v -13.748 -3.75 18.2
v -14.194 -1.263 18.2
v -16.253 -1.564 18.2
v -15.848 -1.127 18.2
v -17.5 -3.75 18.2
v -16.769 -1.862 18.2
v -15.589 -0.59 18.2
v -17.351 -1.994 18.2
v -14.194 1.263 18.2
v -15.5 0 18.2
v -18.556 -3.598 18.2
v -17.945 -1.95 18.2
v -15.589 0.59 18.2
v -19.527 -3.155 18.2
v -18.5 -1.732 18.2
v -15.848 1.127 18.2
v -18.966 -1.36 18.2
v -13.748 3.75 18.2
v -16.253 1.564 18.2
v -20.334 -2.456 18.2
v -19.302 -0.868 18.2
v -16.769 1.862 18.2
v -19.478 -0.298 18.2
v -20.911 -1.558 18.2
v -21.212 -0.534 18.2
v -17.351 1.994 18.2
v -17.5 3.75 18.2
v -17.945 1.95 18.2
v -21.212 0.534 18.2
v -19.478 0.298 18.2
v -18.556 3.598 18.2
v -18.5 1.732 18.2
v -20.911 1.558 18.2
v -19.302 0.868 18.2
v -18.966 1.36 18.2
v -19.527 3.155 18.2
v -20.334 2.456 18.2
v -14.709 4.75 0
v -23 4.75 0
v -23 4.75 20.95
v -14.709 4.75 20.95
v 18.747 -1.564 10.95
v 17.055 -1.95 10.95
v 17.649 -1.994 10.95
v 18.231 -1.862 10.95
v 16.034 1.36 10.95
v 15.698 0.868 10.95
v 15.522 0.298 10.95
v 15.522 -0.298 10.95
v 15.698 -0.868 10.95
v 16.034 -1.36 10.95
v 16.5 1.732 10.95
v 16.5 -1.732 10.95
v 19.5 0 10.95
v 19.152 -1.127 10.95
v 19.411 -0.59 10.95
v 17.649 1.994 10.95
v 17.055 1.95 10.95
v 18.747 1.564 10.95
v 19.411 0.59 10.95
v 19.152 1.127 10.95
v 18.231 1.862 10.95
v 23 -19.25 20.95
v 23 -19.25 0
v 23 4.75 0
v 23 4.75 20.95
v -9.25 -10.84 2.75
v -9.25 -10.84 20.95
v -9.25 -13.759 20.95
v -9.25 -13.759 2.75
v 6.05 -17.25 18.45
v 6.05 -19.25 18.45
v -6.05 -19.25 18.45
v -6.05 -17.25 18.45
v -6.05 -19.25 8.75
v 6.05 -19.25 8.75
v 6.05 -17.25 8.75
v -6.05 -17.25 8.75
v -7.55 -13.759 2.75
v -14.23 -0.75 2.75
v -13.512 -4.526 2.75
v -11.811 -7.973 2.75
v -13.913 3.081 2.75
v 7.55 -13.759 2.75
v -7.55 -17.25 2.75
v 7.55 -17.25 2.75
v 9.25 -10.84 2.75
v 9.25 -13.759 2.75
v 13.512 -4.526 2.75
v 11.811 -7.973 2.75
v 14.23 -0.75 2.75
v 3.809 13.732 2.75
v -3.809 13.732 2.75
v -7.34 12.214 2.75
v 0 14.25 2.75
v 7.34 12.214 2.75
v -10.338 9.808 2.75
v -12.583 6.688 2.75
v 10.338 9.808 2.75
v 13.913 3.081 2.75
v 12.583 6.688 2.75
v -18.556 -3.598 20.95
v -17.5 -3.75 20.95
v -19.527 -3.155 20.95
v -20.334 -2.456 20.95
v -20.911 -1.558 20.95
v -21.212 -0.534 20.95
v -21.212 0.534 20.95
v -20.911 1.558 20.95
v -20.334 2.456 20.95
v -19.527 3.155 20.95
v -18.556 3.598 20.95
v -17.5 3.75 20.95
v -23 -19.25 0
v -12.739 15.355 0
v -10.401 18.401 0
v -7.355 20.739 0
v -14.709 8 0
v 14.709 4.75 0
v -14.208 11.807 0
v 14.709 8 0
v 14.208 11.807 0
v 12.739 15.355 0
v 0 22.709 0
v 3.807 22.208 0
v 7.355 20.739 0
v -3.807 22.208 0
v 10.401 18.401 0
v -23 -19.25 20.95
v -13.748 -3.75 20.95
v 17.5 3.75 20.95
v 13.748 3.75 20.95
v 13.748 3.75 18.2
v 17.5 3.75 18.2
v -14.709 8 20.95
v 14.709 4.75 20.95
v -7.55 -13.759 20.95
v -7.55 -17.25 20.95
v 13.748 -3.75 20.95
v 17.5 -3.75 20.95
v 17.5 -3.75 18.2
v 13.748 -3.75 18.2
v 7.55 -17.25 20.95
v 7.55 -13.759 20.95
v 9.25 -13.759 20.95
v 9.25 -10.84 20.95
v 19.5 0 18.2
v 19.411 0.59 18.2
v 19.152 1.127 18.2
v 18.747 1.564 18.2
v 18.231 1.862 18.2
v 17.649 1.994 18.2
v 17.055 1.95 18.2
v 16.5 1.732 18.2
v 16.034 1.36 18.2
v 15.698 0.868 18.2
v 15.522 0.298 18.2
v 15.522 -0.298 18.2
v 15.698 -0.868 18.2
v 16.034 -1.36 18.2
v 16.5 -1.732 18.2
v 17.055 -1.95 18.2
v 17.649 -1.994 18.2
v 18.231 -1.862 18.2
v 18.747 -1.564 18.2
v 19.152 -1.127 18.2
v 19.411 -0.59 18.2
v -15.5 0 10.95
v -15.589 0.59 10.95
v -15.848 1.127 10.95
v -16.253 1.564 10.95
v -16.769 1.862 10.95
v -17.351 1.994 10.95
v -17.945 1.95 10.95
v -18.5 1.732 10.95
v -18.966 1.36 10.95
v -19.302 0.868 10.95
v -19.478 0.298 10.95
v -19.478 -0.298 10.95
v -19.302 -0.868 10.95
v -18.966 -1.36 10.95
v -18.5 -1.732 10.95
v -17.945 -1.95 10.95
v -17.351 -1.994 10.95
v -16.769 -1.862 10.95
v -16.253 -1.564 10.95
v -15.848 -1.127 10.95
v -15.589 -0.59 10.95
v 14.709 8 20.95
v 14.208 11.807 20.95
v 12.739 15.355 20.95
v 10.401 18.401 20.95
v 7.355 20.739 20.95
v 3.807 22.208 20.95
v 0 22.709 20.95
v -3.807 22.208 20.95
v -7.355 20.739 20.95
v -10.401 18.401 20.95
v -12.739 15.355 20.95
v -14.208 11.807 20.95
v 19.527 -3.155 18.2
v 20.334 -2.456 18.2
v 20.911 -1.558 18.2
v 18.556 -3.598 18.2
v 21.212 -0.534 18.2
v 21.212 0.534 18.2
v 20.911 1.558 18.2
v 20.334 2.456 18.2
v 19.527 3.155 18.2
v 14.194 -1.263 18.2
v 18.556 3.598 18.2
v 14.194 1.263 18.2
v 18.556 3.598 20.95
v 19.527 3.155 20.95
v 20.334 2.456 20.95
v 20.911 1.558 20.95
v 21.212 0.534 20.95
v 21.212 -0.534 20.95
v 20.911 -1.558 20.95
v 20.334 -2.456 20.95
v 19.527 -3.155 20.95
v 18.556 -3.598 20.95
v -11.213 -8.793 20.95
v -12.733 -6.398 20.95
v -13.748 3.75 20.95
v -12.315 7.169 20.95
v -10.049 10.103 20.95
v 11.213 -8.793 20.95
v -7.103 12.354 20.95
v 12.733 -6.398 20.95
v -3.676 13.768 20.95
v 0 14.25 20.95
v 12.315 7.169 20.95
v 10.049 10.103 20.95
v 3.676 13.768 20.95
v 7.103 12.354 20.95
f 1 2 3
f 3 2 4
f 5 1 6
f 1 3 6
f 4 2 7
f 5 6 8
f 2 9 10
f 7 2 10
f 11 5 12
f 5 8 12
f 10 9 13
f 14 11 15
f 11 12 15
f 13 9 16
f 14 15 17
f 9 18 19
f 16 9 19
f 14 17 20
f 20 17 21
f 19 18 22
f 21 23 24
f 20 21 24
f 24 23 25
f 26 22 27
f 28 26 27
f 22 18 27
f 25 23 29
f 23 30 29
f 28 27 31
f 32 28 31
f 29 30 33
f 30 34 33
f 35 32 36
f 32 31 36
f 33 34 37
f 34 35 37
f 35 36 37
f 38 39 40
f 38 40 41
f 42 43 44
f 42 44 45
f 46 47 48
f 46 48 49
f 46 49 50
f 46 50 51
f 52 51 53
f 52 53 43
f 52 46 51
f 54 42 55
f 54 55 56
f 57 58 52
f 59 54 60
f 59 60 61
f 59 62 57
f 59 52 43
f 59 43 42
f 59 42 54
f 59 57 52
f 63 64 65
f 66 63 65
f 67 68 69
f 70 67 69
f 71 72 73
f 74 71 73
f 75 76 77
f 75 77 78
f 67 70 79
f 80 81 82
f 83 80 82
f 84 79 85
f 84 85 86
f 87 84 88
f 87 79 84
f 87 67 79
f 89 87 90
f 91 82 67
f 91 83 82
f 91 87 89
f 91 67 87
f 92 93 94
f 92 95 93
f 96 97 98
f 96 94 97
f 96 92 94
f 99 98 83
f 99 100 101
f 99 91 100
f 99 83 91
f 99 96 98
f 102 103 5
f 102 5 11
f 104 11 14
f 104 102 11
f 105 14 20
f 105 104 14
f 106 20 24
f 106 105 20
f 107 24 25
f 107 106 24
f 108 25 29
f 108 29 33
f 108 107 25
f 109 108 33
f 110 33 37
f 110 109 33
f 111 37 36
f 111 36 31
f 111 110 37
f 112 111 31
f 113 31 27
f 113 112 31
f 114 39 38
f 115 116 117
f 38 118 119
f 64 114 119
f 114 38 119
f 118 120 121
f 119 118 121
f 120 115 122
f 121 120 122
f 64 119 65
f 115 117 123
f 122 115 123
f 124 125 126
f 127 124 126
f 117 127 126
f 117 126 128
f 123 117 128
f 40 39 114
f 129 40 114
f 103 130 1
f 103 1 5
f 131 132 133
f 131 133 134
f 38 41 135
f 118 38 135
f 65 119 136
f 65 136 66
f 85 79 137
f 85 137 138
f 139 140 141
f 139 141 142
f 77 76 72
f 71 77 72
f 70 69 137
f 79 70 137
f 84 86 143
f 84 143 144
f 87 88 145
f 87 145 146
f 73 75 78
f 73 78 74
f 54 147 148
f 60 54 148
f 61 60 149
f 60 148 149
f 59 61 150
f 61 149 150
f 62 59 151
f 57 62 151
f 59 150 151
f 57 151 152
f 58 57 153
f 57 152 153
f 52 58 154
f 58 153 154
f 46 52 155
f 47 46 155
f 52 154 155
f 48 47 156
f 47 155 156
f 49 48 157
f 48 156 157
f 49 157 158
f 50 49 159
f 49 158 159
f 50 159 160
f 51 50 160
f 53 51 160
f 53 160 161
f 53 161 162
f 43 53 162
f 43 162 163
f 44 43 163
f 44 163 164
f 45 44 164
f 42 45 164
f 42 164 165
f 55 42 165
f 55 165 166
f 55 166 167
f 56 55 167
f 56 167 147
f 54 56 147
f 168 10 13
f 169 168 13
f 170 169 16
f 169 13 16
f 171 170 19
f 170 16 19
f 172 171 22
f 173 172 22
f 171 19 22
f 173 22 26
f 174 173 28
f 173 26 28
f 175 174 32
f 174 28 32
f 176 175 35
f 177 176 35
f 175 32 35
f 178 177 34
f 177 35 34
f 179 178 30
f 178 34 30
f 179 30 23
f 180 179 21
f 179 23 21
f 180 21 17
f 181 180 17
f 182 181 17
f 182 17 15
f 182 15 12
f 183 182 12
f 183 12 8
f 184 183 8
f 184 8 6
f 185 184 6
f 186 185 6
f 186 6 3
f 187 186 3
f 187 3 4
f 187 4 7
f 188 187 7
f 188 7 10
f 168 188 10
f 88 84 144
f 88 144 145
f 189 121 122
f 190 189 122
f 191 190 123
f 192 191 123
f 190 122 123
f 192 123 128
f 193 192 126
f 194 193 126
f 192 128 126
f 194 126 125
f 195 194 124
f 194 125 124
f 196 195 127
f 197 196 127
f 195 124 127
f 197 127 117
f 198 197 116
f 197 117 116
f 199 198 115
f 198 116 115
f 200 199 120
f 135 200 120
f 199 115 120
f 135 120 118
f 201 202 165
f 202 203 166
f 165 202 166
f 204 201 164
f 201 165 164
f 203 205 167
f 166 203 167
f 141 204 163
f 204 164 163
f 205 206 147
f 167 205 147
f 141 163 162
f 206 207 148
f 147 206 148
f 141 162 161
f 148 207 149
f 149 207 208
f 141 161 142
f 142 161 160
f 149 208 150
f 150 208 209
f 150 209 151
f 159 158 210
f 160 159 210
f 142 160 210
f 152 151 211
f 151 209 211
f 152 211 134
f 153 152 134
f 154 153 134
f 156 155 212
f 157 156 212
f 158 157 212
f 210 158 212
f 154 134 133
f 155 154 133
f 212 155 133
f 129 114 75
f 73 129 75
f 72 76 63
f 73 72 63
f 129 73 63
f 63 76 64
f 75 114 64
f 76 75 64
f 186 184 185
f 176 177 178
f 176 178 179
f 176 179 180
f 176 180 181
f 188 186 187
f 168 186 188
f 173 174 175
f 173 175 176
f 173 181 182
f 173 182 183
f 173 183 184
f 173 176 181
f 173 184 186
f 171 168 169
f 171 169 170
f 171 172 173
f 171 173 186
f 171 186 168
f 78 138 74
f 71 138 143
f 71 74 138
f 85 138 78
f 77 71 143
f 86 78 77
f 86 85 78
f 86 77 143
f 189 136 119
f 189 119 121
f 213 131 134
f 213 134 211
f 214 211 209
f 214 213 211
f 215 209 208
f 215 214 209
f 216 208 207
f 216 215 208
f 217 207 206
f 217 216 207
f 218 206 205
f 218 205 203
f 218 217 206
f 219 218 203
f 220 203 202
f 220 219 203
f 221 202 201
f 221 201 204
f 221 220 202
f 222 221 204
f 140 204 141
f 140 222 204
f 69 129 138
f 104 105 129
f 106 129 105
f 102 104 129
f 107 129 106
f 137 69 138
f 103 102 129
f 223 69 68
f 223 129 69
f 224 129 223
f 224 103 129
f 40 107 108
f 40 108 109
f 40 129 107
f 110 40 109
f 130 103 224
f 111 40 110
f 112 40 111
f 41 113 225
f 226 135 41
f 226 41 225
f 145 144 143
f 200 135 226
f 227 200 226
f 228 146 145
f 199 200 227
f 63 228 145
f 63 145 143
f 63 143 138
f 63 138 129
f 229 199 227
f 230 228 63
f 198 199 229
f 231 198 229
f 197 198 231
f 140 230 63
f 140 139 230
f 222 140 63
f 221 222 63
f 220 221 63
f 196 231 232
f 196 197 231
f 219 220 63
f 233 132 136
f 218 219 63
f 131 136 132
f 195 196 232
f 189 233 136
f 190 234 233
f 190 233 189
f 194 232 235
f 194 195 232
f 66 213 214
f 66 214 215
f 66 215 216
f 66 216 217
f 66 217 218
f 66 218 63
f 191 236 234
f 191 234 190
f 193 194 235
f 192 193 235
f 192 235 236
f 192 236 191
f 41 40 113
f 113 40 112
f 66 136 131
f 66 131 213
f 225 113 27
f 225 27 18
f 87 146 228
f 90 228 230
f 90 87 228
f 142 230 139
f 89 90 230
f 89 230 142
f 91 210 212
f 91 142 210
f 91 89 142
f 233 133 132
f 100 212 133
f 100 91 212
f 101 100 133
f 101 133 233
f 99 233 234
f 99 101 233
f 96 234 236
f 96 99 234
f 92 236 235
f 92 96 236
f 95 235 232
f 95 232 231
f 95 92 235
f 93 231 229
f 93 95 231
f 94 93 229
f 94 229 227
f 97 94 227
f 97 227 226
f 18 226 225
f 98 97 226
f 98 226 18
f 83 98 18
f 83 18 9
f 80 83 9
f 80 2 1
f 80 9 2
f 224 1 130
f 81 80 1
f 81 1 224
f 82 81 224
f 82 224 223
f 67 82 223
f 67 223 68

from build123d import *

# Parameters (mm, degrees)
BOSS_EXTRUDE1_DEPTH     = 20.95
BOSS_EXTRUDE2_DEPTH     = 2.75
SKETCH6_R               = 2
CUT_EXTRUDE2_DEPTH      = 10
CUT_EXTRUDE3_DEPTH      = 2.75
CUT_EXTRUDE4_DEPTH      = 39.517830206
CUT_EXTRUDE4_DEPTH_BACK = 39.517830206
SKETCH8_W               = 8.290514233
SKETCH8_H               = 3.25
CUT_EXTRUDE5_REACH      = 64.495
SKETCH9_W               = 12.1
SKETCH9_H               = 9.7


with BuildPart() as part:
    # Sketch2 → Boss-Extrude1 (new body)
    with BuildSketch(Plane.XY):
        with BuildLine():
            Line((-14.709485767, 8), (-23, 8))
            Line((-23, 8), (-23, -19.25))
            Line((-23, -19.25), (23, -19.25))
            Line((23, -19.25), (23, 8))
            Line((23, 8), (14.709485767, 8))
            ThreePointArc((14.709485767, 8), (0, 22.709485767), (-14.709485767, 8))
        make_face()
        with BuildLine():
            Line((-7.55, -13.758885964), (-7.55, -17.25))
            Line((-7.55, -17.25), (7.55, -17.25))
            Line((7.55, -17.25), (7.55, -13.758885964))
            Line((7.55, -13.758885964), (9.25, -13.758885964))
            Line((9.25, -13.758885964), (9.25, -10.839741694))
            ThreePointArc((9.25, -10.839741694), (0, 14.25), (-9.25, -10.839741694))
            Line((-9.25, -10.839741694), (-9.25, -13.758885964))
            Line((-9.25, -13.758885964), (-7.55, -13.758885964))
        make_face(mode=Mode.SUBTRACT)
    extrude(amount=BOSS_EXTRUDE1_DEPTH)

    # Sketch3 → Boss-Extrude2 (add)
    with BuildSketch(Plane.XY):
        with BuildLine():
            Line((-14.709485767, 8), (-23, 8))
            Line((-23, 8), (-23, -19.25))
            Line((-23, -19.25), (23, -19.25))
            Line((23, -19.25), (23, 8))
            Line((23, 8), (14.709485767, 8))
            ThreePointArc((14.709485767, 8), (0, 22.709485767), (-14.709485767, 8))
        make_face()
    extrude(amount=BOSS_EXTRUDE2_DEPTH)

    # Sketch6 → Cut-Extrude2 (cut)
    with BuildSketch(Plane.XY.offset(20.95)):
        with Locations((-17.5, 0)):
            Circle(SKETCH6_R)
        with Locations((17.5, 0)):
            Circle(SKETCH6_R)
    extrude(amount=-CUT_EXTRUDE2_DEPTH, mode=Mode.SUBTRACT)

    # Sketch7 → Cut-Extrude3 (cut)
    with BuildSketch(Plane.XY.offset(20.95)):
        with BuildLine():
            Line((-17.5, 3.75), (17.5, 3.75))
            ThreePointArc((17.5, 3.75), (21.25, 0), (17.5, -3.75))
            Line((17.5, -3.75), (-17.5, -3.75))
            ThreePointArc((-17.5, -3.75), (-21.25, 0), (-17.5, 3.75))
        make_face()
    extrude(amount=-CUT_EXTRUDE3_DEPTH, mode=Mode.SUBTRACT)

    # Sketch8 → Cut-Extrude4 (cut, two sides: drawn at the far end of the back side and taken through both)
    with BuildSketch(Plane.XY.offset(20.95).offset(-CUT_EXTRUDE4_DEPTH_BACK)):
        with Locations((-18.854742884, 6.375)):
            Rectangle(SKETCH8_W, SKETCH8_H)
        with Locations((18.854742884, 6.375)):
            Rectangle(SKETCH8_W, SKETCH8_H)
    extrude(amount=CUT_EXTRUDE4_DEPTH + CUT_EXTRUDE4_DEPTH_BACK, mode=Mode.SUBTRACT)

    # Sketch9 → Cut-Extrude5 (cut, up to next)
    with BuildSketch(Plane(origin=(0, -19.25, -19.25), x_dir=(-1, 0, 0), z_dir=(0, 1, 0)), mode=Mode.PRIVATE) as cut_extrude5_sk1:
        with Locations((0, 32.85)):
            Rectangle(SKETCH9_W, SKETCH9_H)
    cut_extrude5_tool1 = extrude(cut_extrude5_sk1.sketch, amount=CUT_EXTRUDE5_REACH, mode=Mode.PRIVATE) & part.part
    add(cut_extrude5_tool1.solids().sort_by_distance((0, -19.25, 13.6))[0], mode=Mode.SUBTRACT)


solid = part.part
